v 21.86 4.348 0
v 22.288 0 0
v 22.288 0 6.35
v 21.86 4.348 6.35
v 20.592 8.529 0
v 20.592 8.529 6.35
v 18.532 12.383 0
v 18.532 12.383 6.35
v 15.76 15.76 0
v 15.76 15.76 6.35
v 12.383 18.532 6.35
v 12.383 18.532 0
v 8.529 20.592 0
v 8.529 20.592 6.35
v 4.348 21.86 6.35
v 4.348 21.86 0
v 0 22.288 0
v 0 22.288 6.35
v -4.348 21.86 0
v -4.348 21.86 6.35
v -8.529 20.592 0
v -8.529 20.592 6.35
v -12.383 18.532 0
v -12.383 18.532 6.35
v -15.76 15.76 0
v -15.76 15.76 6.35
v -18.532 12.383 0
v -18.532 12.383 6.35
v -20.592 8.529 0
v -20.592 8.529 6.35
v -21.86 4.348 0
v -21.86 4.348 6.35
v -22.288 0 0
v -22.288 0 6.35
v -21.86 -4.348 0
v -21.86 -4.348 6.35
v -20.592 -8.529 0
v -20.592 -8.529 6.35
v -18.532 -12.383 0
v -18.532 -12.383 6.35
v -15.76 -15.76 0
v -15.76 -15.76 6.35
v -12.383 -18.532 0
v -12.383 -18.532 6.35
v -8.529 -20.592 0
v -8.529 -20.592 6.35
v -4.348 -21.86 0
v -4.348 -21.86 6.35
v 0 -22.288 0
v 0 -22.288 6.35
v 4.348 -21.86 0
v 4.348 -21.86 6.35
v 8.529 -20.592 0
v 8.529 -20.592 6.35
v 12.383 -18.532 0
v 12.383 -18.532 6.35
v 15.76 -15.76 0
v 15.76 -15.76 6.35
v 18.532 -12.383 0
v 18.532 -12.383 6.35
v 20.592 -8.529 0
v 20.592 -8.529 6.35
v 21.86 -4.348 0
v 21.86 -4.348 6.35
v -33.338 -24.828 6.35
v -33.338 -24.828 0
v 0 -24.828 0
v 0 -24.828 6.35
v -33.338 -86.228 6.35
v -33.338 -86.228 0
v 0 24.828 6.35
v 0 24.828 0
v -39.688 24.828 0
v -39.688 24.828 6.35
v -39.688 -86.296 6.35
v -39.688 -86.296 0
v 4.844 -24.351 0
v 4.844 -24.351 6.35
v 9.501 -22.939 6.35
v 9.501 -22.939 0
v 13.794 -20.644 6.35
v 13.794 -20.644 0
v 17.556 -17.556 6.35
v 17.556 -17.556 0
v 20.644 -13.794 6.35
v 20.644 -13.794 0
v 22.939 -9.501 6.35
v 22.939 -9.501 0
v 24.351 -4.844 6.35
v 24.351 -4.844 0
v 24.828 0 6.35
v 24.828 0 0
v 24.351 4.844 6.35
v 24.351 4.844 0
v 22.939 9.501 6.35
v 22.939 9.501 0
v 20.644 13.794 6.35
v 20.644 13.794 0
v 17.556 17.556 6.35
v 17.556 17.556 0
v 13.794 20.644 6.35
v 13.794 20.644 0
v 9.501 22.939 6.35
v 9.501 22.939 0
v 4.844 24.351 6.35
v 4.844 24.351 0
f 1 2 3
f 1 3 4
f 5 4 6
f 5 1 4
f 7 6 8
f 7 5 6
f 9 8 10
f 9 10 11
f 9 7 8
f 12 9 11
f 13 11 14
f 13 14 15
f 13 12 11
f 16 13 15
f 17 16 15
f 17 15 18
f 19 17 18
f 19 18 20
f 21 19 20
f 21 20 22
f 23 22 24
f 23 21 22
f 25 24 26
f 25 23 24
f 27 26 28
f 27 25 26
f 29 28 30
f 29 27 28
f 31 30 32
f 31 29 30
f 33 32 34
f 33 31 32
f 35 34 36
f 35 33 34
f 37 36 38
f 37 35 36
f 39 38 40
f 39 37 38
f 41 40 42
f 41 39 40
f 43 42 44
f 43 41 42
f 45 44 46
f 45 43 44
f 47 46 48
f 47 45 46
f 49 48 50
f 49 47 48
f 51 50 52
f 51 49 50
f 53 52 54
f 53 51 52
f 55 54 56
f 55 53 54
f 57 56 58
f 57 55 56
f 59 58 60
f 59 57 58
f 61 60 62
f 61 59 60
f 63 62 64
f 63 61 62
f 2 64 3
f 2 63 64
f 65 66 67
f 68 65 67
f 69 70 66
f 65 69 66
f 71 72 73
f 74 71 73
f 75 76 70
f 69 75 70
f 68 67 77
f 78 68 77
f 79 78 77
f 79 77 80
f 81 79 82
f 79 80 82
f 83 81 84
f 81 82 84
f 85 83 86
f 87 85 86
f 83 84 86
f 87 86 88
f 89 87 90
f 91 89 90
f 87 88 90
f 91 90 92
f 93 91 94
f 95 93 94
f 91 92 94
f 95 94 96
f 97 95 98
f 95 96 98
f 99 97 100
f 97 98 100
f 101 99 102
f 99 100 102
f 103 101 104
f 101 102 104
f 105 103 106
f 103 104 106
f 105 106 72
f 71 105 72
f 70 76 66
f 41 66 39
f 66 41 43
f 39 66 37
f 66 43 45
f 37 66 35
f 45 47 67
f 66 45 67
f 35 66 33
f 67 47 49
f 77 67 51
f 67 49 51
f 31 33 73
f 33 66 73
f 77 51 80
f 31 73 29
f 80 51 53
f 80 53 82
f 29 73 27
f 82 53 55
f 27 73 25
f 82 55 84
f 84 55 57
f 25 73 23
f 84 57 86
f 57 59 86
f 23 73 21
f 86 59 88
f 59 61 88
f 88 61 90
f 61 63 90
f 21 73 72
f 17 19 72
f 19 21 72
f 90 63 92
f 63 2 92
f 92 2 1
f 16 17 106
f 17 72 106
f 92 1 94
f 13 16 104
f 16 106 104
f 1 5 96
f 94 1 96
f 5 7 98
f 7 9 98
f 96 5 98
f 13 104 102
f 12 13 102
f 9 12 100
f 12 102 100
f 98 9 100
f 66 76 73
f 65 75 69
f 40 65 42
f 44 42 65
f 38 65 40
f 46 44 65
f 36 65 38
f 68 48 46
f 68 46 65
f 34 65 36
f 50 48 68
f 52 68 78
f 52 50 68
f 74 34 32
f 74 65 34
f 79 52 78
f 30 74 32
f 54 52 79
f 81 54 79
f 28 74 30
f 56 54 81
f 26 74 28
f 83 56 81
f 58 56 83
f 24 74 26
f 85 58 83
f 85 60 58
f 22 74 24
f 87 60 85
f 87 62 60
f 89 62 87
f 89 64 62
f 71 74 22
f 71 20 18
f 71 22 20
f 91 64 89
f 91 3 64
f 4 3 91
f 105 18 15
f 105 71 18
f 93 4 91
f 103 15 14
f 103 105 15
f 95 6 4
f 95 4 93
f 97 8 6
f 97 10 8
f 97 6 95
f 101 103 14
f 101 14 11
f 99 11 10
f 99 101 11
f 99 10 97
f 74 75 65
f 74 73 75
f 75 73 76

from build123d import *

# Parameters (mm, degrees)
F0_R     = 22.2885
F1_DEPTH = 6.35


with BuildPart() as f1:
    # F0 (on Top) → F1 (new body)
    with BuildSketch(Plane.XY):
        with BuildLine():
            Line((-33.337868, -24.8285), (0, -24.8285))
            ThreePointArc((0, -24.8285), (24.8285, 0), (0, 24.8285))
            Line((0, 24.8285), (-39.6875, 24.8285))
            Line((-39.6875, 24.8285), (-39.6875, -86.2965))
            Line((-39.6875, -86.2965), (-33.337868, -86.228111))
            Line((-33.337868, -86.228111), (-33.337868, -24.8285))
        make_face()
        Circle(F0_R, mode=Mode.SUBTRACT)
    extrude(amount=F1_DEPTH)


solid = f1.part
